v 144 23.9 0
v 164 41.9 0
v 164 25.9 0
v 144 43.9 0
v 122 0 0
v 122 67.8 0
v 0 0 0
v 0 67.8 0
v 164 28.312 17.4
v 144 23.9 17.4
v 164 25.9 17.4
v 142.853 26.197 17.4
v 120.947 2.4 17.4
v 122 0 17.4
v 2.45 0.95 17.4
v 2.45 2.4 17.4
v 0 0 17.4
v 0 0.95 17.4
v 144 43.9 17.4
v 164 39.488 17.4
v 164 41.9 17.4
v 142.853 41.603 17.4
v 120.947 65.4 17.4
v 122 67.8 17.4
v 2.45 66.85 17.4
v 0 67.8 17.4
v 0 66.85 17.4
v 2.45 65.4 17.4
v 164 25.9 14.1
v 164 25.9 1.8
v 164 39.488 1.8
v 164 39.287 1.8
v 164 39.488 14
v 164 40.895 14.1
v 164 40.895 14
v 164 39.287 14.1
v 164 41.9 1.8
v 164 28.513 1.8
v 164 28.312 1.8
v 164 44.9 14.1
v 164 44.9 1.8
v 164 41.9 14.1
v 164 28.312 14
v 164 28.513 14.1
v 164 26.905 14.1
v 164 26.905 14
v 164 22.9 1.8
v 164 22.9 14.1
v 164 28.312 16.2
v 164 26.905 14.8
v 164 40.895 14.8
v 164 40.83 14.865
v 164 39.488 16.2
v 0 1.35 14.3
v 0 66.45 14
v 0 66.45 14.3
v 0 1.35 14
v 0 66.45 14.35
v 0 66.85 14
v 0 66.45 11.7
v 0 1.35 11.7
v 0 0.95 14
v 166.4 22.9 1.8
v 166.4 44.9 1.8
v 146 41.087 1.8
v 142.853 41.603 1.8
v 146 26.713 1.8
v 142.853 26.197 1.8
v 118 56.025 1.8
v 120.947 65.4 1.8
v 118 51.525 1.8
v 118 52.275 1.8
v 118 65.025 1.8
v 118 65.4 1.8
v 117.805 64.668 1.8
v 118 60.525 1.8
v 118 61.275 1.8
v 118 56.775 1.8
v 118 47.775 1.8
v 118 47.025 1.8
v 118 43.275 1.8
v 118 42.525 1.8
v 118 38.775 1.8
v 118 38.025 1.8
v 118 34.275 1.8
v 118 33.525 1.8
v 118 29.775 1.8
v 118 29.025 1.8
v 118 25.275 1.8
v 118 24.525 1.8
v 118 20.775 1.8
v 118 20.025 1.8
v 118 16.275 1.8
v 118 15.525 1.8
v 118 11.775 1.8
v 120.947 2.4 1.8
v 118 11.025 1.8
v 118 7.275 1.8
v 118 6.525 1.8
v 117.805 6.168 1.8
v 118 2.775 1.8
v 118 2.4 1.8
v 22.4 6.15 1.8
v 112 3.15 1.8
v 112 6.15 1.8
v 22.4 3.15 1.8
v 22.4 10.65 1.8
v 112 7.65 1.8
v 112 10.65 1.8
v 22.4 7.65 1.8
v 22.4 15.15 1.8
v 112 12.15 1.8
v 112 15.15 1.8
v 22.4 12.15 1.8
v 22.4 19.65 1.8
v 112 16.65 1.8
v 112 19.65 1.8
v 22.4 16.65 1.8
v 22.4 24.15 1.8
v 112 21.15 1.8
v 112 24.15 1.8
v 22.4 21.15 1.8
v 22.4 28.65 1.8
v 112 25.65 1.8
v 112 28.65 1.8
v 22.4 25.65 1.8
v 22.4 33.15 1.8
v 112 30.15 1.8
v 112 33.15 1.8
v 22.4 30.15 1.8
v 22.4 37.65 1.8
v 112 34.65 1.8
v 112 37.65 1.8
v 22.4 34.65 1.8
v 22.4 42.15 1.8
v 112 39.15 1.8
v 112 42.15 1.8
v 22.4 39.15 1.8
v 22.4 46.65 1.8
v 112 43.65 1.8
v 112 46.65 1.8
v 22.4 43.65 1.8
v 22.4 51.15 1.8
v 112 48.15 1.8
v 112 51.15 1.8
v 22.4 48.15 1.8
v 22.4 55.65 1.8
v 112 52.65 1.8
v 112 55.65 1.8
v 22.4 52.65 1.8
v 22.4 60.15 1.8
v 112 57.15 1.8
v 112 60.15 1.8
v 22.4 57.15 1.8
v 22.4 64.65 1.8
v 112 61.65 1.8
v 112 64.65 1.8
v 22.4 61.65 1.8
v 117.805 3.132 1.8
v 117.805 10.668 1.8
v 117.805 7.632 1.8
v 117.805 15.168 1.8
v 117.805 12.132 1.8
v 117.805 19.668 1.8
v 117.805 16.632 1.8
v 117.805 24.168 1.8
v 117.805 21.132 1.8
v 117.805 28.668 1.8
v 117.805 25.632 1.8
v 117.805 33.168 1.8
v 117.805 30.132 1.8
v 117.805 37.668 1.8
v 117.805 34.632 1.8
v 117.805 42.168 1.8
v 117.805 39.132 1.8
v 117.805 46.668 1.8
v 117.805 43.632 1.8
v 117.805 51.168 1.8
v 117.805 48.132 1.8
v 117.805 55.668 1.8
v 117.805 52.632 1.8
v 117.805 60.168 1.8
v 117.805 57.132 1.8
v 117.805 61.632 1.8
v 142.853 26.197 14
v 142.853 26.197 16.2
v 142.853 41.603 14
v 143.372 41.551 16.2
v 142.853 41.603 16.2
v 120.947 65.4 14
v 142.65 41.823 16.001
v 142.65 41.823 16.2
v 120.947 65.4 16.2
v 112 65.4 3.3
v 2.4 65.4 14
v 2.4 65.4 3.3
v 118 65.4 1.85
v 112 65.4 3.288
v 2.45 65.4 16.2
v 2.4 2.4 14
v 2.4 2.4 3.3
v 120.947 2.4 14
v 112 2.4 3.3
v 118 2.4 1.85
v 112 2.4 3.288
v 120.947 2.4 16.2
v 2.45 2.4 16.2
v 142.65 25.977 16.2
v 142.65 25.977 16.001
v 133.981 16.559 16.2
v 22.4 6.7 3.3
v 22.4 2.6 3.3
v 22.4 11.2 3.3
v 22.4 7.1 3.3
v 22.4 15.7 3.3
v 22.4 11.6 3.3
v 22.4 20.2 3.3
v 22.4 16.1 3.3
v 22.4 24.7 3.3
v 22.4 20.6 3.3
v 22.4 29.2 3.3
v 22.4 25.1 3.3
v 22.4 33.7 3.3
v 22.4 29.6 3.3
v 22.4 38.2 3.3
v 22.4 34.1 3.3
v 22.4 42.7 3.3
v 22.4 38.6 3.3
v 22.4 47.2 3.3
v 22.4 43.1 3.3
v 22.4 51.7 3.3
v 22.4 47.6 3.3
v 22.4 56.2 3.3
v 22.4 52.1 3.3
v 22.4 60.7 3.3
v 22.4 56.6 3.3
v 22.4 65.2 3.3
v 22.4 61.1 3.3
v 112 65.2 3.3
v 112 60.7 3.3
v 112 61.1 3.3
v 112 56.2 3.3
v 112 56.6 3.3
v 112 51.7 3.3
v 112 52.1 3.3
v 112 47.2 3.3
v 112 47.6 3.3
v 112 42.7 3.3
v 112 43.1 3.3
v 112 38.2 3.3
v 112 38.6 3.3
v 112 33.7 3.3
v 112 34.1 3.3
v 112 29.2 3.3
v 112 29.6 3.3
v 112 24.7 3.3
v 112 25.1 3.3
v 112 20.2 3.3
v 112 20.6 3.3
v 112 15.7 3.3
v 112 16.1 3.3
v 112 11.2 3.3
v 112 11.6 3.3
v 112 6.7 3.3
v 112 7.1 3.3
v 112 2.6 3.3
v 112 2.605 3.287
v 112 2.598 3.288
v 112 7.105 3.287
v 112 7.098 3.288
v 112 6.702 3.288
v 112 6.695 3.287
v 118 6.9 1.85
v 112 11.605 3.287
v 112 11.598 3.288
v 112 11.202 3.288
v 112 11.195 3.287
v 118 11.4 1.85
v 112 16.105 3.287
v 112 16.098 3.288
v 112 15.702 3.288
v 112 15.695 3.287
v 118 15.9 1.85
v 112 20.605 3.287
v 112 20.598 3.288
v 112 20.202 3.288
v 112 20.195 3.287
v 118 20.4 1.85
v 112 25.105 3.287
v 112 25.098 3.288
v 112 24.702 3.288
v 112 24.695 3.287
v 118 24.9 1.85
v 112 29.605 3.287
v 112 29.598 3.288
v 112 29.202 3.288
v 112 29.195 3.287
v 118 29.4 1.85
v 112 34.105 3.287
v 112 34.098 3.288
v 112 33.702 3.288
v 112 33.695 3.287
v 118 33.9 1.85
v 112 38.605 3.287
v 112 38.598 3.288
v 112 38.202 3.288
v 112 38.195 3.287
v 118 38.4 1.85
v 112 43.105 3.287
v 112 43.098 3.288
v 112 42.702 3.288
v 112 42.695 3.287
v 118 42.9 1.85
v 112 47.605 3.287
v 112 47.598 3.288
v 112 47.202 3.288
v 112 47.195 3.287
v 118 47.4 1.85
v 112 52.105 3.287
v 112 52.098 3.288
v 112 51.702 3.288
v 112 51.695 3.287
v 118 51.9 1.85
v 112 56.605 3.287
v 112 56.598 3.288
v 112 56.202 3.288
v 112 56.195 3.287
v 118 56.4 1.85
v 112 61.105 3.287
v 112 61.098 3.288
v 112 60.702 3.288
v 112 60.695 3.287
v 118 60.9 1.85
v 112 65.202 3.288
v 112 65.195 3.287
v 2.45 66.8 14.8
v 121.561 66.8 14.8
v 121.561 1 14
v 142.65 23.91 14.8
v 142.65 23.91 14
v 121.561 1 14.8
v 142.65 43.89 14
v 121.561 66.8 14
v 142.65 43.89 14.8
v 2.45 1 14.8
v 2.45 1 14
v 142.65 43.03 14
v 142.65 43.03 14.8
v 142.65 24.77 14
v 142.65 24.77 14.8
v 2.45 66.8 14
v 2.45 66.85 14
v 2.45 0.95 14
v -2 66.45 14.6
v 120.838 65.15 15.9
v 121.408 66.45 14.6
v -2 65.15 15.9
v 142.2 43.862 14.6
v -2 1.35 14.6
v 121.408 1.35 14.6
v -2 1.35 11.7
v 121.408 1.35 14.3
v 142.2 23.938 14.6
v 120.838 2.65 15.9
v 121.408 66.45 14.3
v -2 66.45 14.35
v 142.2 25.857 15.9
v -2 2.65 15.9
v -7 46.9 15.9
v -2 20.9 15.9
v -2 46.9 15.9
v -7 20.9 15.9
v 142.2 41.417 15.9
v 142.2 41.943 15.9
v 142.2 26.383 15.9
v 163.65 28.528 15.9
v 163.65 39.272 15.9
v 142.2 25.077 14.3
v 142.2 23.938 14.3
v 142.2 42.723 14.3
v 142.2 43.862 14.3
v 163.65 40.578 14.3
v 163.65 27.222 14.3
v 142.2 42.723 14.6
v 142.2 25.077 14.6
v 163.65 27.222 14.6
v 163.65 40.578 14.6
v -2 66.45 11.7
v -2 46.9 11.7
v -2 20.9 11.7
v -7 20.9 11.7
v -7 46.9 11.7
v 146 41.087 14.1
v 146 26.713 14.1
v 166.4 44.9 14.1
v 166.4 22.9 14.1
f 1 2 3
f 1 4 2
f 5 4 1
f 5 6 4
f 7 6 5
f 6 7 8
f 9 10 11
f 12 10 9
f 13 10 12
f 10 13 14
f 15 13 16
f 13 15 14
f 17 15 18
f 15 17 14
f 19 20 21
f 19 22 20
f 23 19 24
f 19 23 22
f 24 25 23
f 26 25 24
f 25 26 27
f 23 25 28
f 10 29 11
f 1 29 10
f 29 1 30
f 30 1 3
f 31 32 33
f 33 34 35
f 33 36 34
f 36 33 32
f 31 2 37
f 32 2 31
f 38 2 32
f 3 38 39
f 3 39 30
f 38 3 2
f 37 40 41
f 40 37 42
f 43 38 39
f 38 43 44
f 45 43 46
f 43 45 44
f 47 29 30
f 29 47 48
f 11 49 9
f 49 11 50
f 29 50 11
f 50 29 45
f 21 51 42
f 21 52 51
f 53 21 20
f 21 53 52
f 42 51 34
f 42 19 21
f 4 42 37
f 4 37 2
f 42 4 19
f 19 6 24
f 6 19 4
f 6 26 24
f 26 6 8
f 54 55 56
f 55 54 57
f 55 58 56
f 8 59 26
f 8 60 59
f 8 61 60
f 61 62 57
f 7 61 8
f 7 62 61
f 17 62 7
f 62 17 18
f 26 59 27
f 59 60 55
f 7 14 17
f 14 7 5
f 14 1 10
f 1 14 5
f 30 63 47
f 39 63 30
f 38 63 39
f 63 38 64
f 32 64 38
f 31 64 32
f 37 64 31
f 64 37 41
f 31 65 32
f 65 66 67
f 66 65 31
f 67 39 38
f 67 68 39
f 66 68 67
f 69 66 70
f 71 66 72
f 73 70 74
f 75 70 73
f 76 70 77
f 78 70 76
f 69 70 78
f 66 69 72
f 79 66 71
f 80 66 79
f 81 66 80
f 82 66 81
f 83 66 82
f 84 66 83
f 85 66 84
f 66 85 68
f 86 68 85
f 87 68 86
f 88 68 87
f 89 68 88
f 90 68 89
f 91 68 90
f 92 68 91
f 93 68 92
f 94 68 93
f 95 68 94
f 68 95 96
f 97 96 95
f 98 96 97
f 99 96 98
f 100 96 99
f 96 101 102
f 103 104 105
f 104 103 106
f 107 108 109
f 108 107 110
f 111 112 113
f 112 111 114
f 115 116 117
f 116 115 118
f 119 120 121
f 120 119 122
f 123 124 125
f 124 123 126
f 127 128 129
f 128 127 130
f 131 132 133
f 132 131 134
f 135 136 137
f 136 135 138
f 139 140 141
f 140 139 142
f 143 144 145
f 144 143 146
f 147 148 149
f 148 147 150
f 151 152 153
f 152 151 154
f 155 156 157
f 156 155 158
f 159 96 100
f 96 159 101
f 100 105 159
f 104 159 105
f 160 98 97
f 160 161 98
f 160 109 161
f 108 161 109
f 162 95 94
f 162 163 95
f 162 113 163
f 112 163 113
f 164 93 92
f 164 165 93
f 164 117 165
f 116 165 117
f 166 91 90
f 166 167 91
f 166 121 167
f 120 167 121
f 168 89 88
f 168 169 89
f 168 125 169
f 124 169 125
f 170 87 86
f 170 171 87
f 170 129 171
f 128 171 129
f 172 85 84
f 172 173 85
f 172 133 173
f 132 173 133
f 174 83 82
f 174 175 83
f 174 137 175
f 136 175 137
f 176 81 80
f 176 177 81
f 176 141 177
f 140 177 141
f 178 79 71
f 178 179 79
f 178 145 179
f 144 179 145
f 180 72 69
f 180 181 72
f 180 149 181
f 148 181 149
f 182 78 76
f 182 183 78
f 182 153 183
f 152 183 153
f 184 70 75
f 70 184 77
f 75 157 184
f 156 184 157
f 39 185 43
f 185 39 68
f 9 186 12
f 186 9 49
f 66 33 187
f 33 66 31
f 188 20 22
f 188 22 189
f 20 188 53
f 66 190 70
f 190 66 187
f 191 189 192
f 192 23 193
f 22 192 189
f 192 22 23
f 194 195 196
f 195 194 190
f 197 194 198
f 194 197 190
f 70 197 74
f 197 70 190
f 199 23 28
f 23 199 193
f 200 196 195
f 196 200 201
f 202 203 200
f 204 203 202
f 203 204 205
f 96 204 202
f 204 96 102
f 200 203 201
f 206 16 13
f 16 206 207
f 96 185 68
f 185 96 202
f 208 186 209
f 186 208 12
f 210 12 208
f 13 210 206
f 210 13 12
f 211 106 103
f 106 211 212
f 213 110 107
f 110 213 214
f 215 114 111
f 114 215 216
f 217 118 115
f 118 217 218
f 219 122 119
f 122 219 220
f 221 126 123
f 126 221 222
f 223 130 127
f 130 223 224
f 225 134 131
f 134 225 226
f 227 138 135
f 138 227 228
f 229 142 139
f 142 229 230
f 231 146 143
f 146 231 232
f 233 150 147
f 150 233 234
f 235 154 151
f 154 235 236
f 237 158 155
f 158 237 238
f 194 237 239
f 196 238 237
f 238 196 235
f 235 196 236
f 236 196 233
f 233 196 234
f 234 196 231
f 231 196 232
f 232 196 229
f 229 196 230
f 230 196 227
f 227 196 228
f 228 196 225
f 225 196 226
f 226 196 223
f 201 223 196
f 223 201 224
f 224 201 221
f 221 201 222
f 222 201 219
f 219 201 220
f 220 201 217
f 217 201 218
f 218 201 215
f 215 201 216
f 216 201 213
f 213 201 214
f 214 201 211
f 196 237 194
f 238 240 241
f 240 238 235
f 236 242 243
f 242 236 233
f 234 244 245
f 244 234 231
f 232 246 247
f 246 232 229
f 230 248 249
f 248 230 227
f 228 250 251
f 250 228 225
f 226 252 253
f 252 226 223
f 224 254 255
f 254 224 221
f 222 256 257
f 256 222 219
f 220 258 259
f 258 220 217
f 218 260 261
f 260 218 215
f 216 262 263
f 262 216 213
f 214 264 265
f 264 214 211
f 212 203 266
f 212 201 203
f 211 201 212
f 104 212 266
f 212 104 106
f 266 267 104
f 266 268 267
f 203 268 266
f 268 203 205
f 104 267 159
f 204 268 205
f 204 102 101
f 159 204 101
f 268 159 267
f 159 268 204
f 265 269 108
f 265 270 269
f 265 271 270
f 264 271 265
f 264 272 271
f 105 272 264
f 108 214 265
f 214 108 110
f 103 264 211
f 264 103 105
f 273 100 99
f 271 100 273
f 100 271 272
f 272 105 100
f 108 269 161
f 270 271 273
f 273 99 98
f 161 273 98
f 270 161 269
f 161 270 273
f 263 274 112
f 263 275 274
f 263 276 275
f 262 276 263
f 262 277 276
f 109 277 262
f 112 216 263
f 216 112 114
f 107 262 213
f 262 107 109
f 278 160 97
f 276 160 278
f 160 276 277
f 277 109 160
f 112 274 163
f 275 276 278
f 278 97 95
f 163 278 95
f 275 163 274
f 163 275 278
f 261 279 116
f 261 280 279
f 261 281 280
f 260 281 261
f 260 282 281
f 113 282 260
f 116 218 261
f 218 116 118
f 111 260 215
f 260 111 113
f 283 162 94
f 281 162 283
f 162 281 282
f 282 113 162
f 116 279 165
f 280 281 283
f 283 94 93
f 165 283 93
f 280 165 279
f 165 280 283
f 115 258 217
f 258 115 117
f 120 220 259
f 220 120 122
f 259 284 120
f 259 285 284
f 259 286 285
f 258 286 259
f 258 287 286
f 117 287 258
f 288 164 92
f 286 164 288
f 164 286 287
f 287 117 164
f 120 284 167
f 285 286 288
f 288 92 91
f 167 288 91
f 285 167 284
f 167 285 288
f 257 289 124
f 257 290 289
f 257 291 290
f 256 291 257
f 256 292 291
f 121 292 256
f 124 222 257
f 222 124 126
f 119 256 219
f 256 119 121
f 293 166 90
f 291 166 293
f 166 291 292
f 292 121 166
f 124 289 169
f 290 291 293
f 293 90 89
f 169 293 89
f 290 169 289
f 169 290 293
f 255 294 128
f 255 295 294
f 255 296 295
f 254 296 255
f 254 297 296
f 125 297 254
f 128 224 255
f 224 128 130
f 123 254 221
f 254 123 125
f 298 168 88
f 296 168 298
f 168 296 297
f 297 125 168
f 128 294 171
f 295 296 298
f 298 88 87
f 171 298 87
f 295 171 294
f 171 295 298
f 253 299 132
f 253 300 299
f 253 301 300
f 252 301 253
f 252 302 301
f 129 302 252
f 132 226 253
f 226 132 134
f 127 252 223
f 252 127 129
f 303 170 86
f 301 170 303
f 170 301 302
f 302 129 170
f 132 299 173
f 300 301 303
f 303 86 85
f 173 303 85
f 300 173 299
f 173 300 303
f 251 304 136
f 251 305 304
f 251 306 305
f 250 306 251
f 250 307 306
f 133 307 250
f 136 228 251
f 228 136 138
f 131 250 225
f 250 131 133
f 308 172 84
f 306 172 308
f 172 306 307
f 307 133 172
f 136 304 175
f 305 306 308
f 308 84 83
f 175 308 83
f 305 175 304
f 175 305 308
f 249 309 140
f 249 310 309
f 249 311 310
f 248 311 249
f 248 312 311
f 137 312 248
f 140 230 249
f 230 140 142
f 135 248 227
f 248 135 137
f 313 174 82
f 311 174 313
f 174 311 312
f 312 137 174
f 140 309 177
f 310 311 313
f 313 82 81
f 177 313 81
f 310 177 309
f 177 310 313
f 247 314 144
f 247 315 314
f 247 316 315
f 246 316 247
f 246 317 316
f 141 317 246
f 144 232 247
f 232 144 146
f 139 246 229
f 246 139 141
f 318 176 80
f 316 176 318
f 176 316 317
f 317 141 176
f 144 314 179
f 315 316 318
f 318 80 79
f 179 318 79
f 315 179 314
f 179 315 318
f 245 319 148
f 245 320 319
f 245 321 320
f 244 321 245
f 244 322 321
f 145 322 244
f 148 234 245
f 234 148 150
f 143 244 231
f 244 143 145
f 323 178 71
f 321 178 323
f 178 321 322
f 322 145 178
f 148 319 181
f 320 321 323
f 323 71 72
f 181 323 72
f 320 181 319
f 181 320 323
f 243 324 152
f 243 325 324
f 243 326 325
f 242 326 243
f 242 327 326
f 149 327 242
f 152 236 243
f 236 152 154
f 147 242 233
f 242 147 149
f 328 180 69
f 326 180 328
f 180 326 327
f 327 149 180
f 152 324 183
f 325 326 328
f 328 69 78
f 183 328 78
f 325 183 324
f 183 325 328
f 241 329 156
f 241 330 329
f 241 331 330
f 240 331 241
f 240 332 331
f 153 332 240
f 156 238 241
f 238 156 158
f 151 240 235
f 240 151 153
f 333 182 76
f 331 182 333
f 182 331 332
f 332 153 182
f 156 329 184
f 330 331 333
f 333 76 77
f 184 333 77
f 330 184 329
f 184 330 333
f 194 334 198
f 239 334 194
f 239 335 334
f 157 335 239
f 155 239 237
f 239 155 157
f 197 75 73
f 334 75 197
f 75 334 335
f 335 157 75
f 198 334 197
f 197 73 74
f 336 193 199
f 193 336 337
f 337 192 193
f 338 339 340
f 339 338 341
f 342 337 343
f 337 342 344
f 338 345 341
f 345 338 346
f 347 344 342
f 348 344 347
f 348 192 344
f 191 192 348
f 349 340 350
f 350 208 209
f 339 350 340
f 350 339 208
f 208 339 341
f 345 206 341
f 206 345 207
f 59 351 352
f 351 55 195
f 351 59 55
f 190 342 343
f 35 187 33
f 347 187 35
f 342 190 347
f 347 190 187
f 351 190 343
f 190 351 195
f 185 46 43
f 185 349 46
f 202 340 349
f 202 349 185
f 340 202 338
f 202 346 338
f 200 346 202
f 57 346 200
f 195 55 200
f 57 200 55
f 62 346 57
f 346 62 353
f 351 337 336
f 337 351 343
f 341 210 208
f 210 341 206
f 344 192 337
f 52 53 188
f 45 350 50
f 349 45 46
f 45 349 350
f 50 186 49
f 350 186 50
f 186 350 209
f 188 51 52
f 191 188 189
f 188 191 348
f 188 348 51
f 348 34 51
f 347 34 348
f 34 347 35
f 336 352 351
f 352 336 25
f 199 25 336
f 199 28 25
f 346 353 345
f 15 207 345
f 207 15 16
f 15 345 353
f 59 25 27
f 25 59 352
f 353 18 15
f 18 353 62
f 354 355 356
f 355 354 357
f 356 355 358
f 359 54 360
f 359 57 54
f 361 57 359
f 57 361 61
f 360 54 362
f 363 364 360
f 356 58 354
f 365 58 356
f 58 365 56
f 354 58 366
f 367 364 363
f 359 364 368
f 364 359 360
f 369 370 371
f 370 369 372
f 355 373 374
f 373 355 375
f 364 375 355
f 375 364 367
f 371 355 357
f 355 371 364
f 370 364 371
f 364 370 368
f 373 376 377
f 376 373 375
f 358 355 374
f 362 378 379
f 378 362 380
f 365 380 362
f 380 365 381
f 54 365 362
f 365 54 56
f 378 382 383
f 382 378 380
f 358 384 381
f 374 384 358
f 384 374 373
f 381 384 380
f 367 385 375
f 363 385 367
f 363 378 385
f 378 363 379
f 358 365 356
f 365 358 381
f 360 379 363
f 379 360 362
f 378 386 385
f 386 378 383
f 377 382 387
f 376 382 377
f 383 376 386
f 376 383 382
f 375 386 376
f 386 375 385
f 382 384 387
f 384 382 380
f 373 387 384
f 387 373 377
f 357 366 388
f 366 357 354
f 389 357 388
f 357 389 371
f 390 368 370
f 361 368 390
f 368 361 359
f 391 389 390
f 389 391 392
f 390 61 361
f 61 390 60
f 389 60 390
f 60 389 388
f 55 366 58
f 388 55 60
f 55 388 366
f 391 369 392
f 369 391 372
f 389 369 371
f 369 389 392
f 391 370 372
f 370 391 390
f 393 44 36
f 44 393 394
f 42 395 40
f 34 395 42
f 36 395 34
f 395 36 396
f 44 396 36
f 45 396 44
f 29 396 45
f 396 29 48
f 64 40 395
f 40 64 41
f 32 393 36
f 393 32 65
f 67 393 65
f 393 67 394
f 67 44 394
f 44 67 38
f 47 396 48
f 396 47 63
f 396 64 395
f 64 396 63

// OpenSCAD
// Generated CAD, millimeters. Edit build_tray.py dimensions and rebuild for parameter changes.
// F6 render; choose part below. Export tray/lid/plug in their print orientations.
part = "assembly"; // "tray", "lid", "plug", "assembly", "exploded"
module tray(){difference(){difference(){difference(){union(){union(){union(){union(){union(){union(){union(){union(){union(){union(){union(){union(){union(){union(){union(){union(){difference(){translate([0,0,0])linear_extrude(height=17.4)polygon(points=[[144.0,23.899999998509884],[164.0,25.899999998509884],[164.0,41.899999998509884],[144.0,43.899999998509884],[122.0,67.79999999701977],[0.0,67.79999999701977],[0.0,0.0],[122.0,0.0]],paths=[[0,1,2,3,4,5,6,7]]);translate([0,0,1.8])linear_extrude(height=16.599999999999998)polygon(points=[[142.852615326643,26.1972316801548],[154.7516910508275,27.38713925331831],[165.0,28.411970146000385],[165.0,39.38802985101938],[144.0,41.4880298525095],[144.0,41.48802984505892],[142.852615326643,41.60276831686497],[120.94721379131079,65.39999999850988],[2.399999998509884,65.39999999850988],[2.399999998509884,2.399999998509884],[120.94721379131079,2.399999998509884]],paths=[[0,1,2,3,4,5,6,7,8,9,10]]);}translate([2.35,2.35,1.75])cube([20.049999999999997,63.09999999999999,1.5499999999999998]);}intersection(){union(){polyhedron(points=[[22.350000381469727,1.649999976158142,1.75],[22.350000381469727,1.649999976158142,1.7999999523162842],[22.350000381469727,2.200000047683716,3.299999952316284],[22.350000381469727,3.1500000953674316,1.75],[22.350000381469727,3.1500000953674316,1.7999999523162842],[22.350000381469727,2.5999999046325684,3.299999952316284],[112.0,1.649999976158142,1.75],[112.0,1.649999976158142,1.7999999523162842],[112.0,2.200000047683716,3.299999952316284],[112.0,3.1500000953674316,1.75],[112.0,3.1500000953674316,1.7999999523162842],[112.0,2.5999999046325684,3.299999952316284]],faces=[[1,0,2],[1,6,0],[3,0,6],[2,0,5],[8,1,2],[3,5,0],[4,5,3],[4,3,10],[4,10,5],[11,2,5],[6,1,7],[8,7,1],[7,11,6],[8,2,11],[8,11,7],[9,3,6],[9,10,3],[9,6,10],[11,10,6],[11,5,10]],convexity=10);polyhedron(points=[[111.94999694824219,1.649999976158142,1.75],[111.94999694824219,1.649999976158142,1.7999999523162842],[111.94999694824219,2.200000047683716,3.299999952316284],[111.94999694824219,3.1500000953674316,1.75],[111.94999694824219,3.1500000953674316,1.7999999523162842],[111.94999694824219,2.5999999046325684,3.299999952316284],[118.0,1.649999976158142,1.75],[118.0,2.4000000953674316,1.850000023841858],[118.0,3.1500000953674316,1.75]],faces=[[1,0,2],[1,6,0],[1,2,6],[3,0,6],[2,0,5],[3,5,0],[4,5,3],[4,3,8],[4,8,5],[7,2,5],[7,6,2],[8,3,6],[7,5,8],[7,8,6]],convexity=10);}translate([0,0,0])linear_extrude(height=17.4)polygon(points=[[144.0,23.899999998509884],[164.0,25.899999998509884],[164.0,41.899999998509884],[144.0,43.899999998509884],[122.0,67.79999999701977],[0.0,67.79999999701977],[0.0,0.0],[122.0,0.0]],paths=[[0,1,2,3,4,5,6,7]]);}}intersection(){union(){polyhedron(points=[[22.350000381469727,6.150000095367432,1.75],[22.350000381469727,6.150000095367432,1.7999999523162842],[22.350000381469727,6.699999809265137,3.299999952316284],[22.350000381469727,7.650000095367432,1.75],[22.350000381469727,7.650000095367432,1.7999999523162842],[22.350000381469727,7.099999904632568,3.299999952316284],[112.0,6.150000095367432,1.75],[112.0,6.150000095367432,1.7999999523162842],[112.0,6.699999809265137,3.299999952316284],[112.0,7.650000095367432,1.75],[112.0,7.650000095367432,1.7999999523162842],[112.0,7.099999904632568,3.299999952316284]],faces=[[1,0,2],[1,6,0],[7,1,2],[3,0,6],[2,0,5],[3,5,0],[4,5,3],[4,3,10],[4,10,5],[11,2,5],[6,1,7],[7,11,6],[8,7,2],[8,2,11],[8,11,7],[9,3,6],[9,10,3],[9,6,10],[11,10,6],[11,5,10]],convexity=10);polyhedron(points=[[111.94999694824219,6.150000095367432,1.75],[111.94999694824219,6.150000095367432,1.7999999523162842],[111.94999694824219,6.699999809265137,3.299999952316284],[111.94999694824219,7.650000095367432,1.75],[111.94999694824219,7.650000095367432,1.7999999523162842],[111.94999694824219,7.099999904632568,3.299999952316284],[118.0,6.150000095367432,1.75],[118.0,6.900000095367432,1.850000023841858],[118.0,7.650000095367432,1.75]],faces=[[1,0,2],[1,6,0],[1,2,6],[3,0,6],[2,0,5],[3,5,0],[4,5,3],[4,3,8],[4,8,5],[7,2,5],[7,6,2],[8,3,6],[7,5,8],[7,8,6]],convexity=10);}translate([0,0,0])linear_extrude(height=17.4)polygon(points=[[144.0,23.899999998509884],[164.0,25.899999998509884],[164.0,41.899999998509884],[144.0,43.899999998509884],[122.0,67.79999999701977],[0.0,67.79999999701977],[0.0,0.0],[122.0,0.0]],paths=[[0,1,2,3,4,5,6,7]]);}}intersection(){union(){polyhedron(points=[[22.350000381469727,10.649999618530273,1.75],[22.350000381469727,10.649999618530273,1.7999999523162842],[22.350000381469727,11.199999809265137,3.299999952316284],[22.350000381469727,12.149999618530273,1.75],[22.350000381469727,12.149999618530273,1.7999999523162842],[22.350000381469727,11.600000381469727,3.299999952316284],[112.0,10.649999618530273,1.75],[112.0,10.649999618530273,1.7999999523162842],[112.0,11.199999809265137,3.299999952316284],[112.0,12.149999618530273,1.75],[112.0,12.149999618530273,1.7999999523162842],[112.0,11.600000381469727,3.299999952316284]],faces=[[1,0,2],[1,6,0],[7,1,2],[3,0,6],[2,0,5],[3,5,0],[4,5,3],[4,3,10],[4,10,5],[11,2,5],[6,1,7],[7,11,6],[8,7,2],[8,2,11],[8,11,7],[9,3,6],[9,10,3],[9,6,10],[11,10,6],[11,5,10]],convexity=10);polyhedron(points=[[111.94999694824219,10.649999618530273,1.75],[111.94999694824219,10.649999618530273,1.7999999523162842],[111.94999694824219,11.199999809265137,3.299999952316284],[111.94999694824219,12.149999618530273,1.75],[111.94999694824219,12.149999618530273,1.7999999523162842],[111.94999694824219,11.600000381469727,3.299999952316284],[118.0,10.649999618530273,1.75],[118.0,11.399999618530273,1.850000023841858],[118.0,12.149999618530273,1.75]],faces=[[1,0,2],[1,6,0],[1,2,6],[3,0,6],[2,0,5],[3,5,0],[4,5,3],[4,3,8],[4,8,5],[7,2,5],[7,6,2],[8,3,6],[8,7,5],[7,8,6]],convexity=10);}translate([0,0,0])linear_extrude(height=17.4)polygon(points=[[144.0,23.899999998509884],[164.0,25.899999998509884],[164.0,41.899999998509884],[144.0,43.899999998509884],[122.0,67.79999999701977],[0.0,67.79999999701977],[0.0,0.0],[122.0,0.0]],paths=[[0,1,2,3,4,5,6,7]]);}}intersection(){union(){polyhedron(points=[[22.350000381469727,15.149999618530273,1.75],[22.350000381469727,15.149999618530273,1.7999999523162842],[22.350000381469727,15.699999809265137,3.299999952316284],[22.350000381469727,16.649999618530273,1.75],[22.350000381469727,16.649999618530273,1.7999999523162842],[22.350000381469727,16.100000381469727,3.299999952316284],[112.0,15.149999618530273,1.75],[112.0,15.149999618530273,1.7999999523162842],[112.0,15.699999809265137,3.299999952316284],[112.0,16.649999618530273,1.75],[112.0,16.649999618530273,1.7999999523162842],[112.0,16.100000381469727,3.299999952316284]],faces=[[1,0,2],[1,6,0],[7,1,2],[3,0,6],[2,0,5],[3,5,0],[4,5,3],[4,3,10],[4,10,5],[11,2,5],[6,1,7],[7,11,6],[8,7,2],[8,2,11],[8,11,7],[9,3,6],[9,10,3],[9,6,10],[11,10,6],[11,5,10]],convexity=10);polyhedron(points=[[111.94999694824219,15.149999618530273,1.75],[111.94999694824219,15.149999618530273,1.7999999523162842],[111.94999694824219,15.699999809265137,3.299999952316284],[111.94999694824219,16.649999618530273,1.75],[111.94999694824219,16.649999618530273,1.7999999523162842],[111.94999694824219,16.100000381469727,3.299999952316284],[118.0,15.149999618530273,1.75],[118.0,15.899999618530273,1.850000023841858],[118.0,16.649999618530273,1.75]],faces=[[1,0,2],[1,6,0],[1,2,6],[3,0,6],[2,0,5],[3,5,0],[4,5,3],[4,3,8],[4,8,5],[7,2,5],[7,6,2],[7,8,6],[8,3,6],[7,5,8]],convexity=10);}translate([0,0,0])linear_extrude(height=17.4)polygon(points=[[144.0,23.899999998509884],[164.0,25.899999998509884],[164.0,41.899999998509884],[144.0,43.899999998509884],[122.0,67.79999999701977],[0.0,67.79999999701977],[0.0,0.0],[122.0,0.0]],paths=[[0,1,2,3,4,5,6,7]]);}}intersection(){union(){polyhedron(points=[[22.350000381469727,19.649999618530273,1.75],[22.350000381469727,19.649999618530273,1.7999999523162842],[22.350000381469727,20.200000762939453,3.299999952316284],[22.350000381469727,21.149999618530273,1.75],[22.350000381469727,21.149999618530273,1.7999999523162842],[22.350000381469727,20.600000381469727,3.299999952316284],[112.0,19.649999618530273,1.75],[112.0,19.649999618530273,1.7999999523162842],[112.0,20.200000762939453,3.299999952316284],[112.0,21.149999618530273,1.75],[112.0,21.149999618530273,1.7999999523162842],[112.0,20.600000381469727,3.299999952316284]],faces=[[1,0,2],[1,6,0],[3,0,6],[2,0,5],[8,1,2],[3,5,0],[4,5,3],[4,3,10],[2,5,11],[4,11,5],[6,1,7],[8,7,1],[7,11,6],[8,2,11],[8,11,7],[9,3,6],[9,10,3],[11,4,10],[9,6,10],[11,10,6]],convexity=10);polyhedron(points=[[111.94999694824219,19.649999618530273,1.75],[111.94999694824219,19.649999618530273,1.7999999523162842],[111.94999694824219,20.200000762939453,3.299999952316284],[111.94999694824219,21.149999618530273,1.75],[111.94999694824219,21.149999618530273,1.7999999523162842],[111.94999694824219,20.600000381469727,3.299999952316284],[118.0,19.649999618530273,1.75],[118.0,20.399999618530273,1.850000023841858],[118.0,21.149999618530273,1.75]],faces=[[1,0,2],[1,6,0],[1,2,6],[3,0,6],[2,0,5],[3,5,0],[4,5,3],[4,3,8],[4,8,5],[7,2,5],[7,6,2],[8,3,6],[8,7,5],[7,8,6]],convexity=10);}translate([0,0,0])linear_extrude(height=17.4)polygon(points=[[144.0,23.899999998509884],[164.0,25.899999998509884],[164.0,41.899999998509884],[144.0,43.899999998509884],[122.0,67.79999999701977],[0.0,67.79999999701977],[0.0,0.0],[122.0,0.0]],paths=[[0,1,2,3,4,5,6,7]]);}}intersection(){union(){polyhedron(points=[[22.350000381469727,24.149999618530273,1.75],[22.350000381469727,24.149999618530273,1.7999999523162842],[22.350000381469727,24.700000762939453,3.299999952316284],[22.350000381469727,25.649999618530273,1.75],[22.350000381469727,25.649999618530273,1.7999999523162842],[22.350000381469727,25.100000381469727,3.299999952316284],[112.0,24.149999618530273,1.75],[112.0,24.149999618530273,1.7999999523162842],[112.0,24.700000762939453,3.299999952316284],[112.0,25.649999618530273,1.75],[112.0,25.649999618530273,1.7999999523162842],[112.0,25.100000381469727,3.299999952316284]],faces=[[1,0,2],[1,6,0],[7,1,2],[3,0,6],[2,0,5],[3,5,0],[4,5,3],[4,3,10],[4,10,5],[11,2,5],[6,1,7],[7,11,6],[8,7,2],[8,2,11],[8,11,7],[9,3,6],[9,10,3],[9,6,10],[11,10,6],[11,5,10]],convexity=10);polyhedron(points=[[111.94999694824219,24.149999618530273,1.75],[111.94999694824219,24.149999618530273,1.7999999523162842],[111.94999694824219,24.700000762939453,3.299999952316284],[111.94999694824219,25.649999618530273,1.75],[111.94999694824219,25.649999618530273,1.7999999523162842],[111.94999694824219,25.100000381469727,3.299999952316284],[118.0,24.149999618530273,1.75],[118.0,24.899999618530273,1.850000023841858],[118.0,25.649999618530273,1.75]],faces=[[1,0,2],[1,6,0],[1,2,6],[3,0,6],[2,0,5],[7,2,5],[3,5,0],[4,5,3],[4,3,8],[4,8,5],[7,6,2],[7,8,6],[8,3,6],[8,7,5]],convexity=10);}translate([0,0,0])linear_extrude(height=17.4)polygon(points=[[144.0,23.899999998509884],[164.0,25.899999998509884],[164.0,41.899999998509884],[144.0,43.899999998509884],[122.0,67.79999999701977],[0.0,67.79999999701977],[0.0,0.0],[122.0,0.0]],paths=[[0,1,2,3,4,5,6,7]]);}}intersection(){union(){polyhedron(points=[[22.350000381469727,28.649999618530273,1.75],[22.350000381469727,28.649999618530273,1.7999999523162842],[22.350000381469727,29.200000762939453,3.299999952316284],[22.350000381469727,30.149999618530273,1.75],[22.350000381469727,30.149999618530273,1.7999999523162842],[22.350000381469727,29.600000381469727,3.299999952316284],[112.0,28.649999618530273,1.75],[112.0,28.649999618530273,1.7999999523162842],[112.0,29.200000762939453,3.299999952316284],[112.0,30.149999618530273,1.75],[112.0,30.149999618530273,1.7999999523162842],[112.0,29.600000381469727,3.299999952316284]],faces=[[1,0,2],[1,6,0],[7,1,2],[3,0,6],[2,0,5],[3,5,0],[4,5,3],[4,3,10],[4,10,5],[11,2,5],[6,1,7],[7,11,6],[8,7,2],[8,2,11],[8,11,7],[9,3,6],[9,10,3],[9,6,10],[11,10,6],[11,5,10]],convexity=10);polyhedron(points=[[111.94999694824219,28.649999618530273,1.75],[111.94999694824219,28.649999618530273,1.7999999523162842],[111.94999694824219,29.200000762939453,3.299999952316284],[111.94999694824219,30.149999618530273,1.75],[111.94999694824219,30.149999618530273,1.7999999523162842],[111.94999694824219,29.600000381469727,3.299999952316284],[118.0,28.649999618530273,1.75],[118.0,29.399999618530273,1.850000023841858],[118.0,30.149999618530273,1.75]],faces=[[1,0,2],[1,6,0],[1,2,6],[3,0,6],[2,0,5],[7,2,5],[3,5,0],[4,5,3],[4,3,8],[4,8,5],[7,6,2],[7,8,6],[8,3,6],[8,7,5]],convexity=10);}translate([0,0,0])linear_extrude(height=17.4)polygon(points=[[144.0,23.899999998509884],[164.0,25.899999998509884],[164.0,41.899999998509884],[144.0,43.899999998509884],[122.0,67.79999999701977],[0.0,67.79999999701977],[0.0,0.0],[122.0,0.0]],paths=[[0,1,2,3,4,5,6,7]]);}}intersection(){union(){polyhedron(points=[[22.350000381469727,33.150001525878906,1.75],[22.350000381469727,33.150001525878906,1.7999999523162842],[22.350000381469727,33.70000076293945,3.299999952316284],[22.350000381469727,34.650001525878906,1.75],[22.350000381469727,34.650001525878906,1.7999999523162842],[22.350000381469727,34.099998474121094,3.299999952316284],[112.0,33.150001525878906,1.75],[112.0,33.150001525878906,1.7999999523162842],[112.0,33.70000076293945,3.299999952316284],[112.0,34.650001525878906,1.75],[112.0,34.650001525878906,1.7999999523162842],[112.0,34.099998474121094,3.299999952316284]],faces=[[1,0,2],[1,6,0],[7,1,2],[3,0,6],[2,0,5],[3,5,0],[4,5,3],[4,3,10],[4,10,5],[11,2,5],[6,1,7],[7,11,6],[8,7,2],[8,2,11],[8,11,7],[9,3,6],[9,10,3],[9,6,10],[11,10,6],[11,5,10]],convexity=10);polyhedron(points=[[111.94999694824219,33.150001525878906,1.75],[111.94999694824219,33.150001525878906,1.7999999523162842],[111.94999694824219,33.70000076293945,3.299999952316284],[111.94999694824219,34.650001525878906,1.75],[111.94999694824219,34.650001525878906,1.7999999523162842],[111.94999694824219,34.099998474121094,3.299999952316284],[118.0,33.150001525878906,1.75],[118.0,33.900001525878906,1.850000023841858],[118.0,34.650001525878906,1.75]],faces=[[1,0,2],[1,6,0],[1,2,6],[3,0,6],[2,0,5],[3,5,0],[4,5,3],[4,3,8],[4,8,5],[7,2,5],[7,6,2],[8,3,6],[8,7,5],[7,8,6]],convexity=10);}translate([0,0,0])linear_extrude(height=17.4)polygon(points=[[144.0,23.899999998509884],[164.0,25.899999998509884],[164.0,41.899999998509884],[144.0,43.899999998509884],[122.0,67.79999999701977],[0.0,67.79999999701977],[0.0,0.0],[122.0,0.0]],paths=[[0,1,2,3,4,5,6,7]]);}}intersection(){union(){polyhedron(points=[[22.350000381469727,37.650001525878906,1.75],[22.350000381469727,37.650001525878906,1.7999999523162842],[22.350000381469727,38.20000076293945,3.299999952316284],[22.350000381469727,39.150001525878906,1.75],[22.350000381469727,39.150001525878906,1.7999999523162842],[22.350000381469727,38.599998474121094,3.299999952316284],[112.0,37.650001525878906,1.75],[112.0,37.650001525878906,1.7999999523162842],[112.0,38.20000076293945,3.299999952316284],[112.0,39.150001525878906,1.75],[112.0,39.150001525878906,1.7999999523162842],[112.0,38.599998474121094,3.299999952316284]],faces=[[1,0,2],[1,6,0],[7,1,2],[3,0,6],[2,0,5],[3,5,0],[4,5,3],[4,3,10],[4,10,5],[11,2,5],[6,1,7],[7,11,6],[8,7,2],[8,2,11],[8,11,7],[9,3,6],[9,10,3],[9,6,10],[11,10,6],[11,5,10]],convexity=10);polyhedron(points=[[111.94999694824219,37.650001525878906,1.75],[111.94999694824219,37.650001525878906,1.7999999523162842],[111.94999694824219,38.20000076293945,3.299999952316284],[111.94999694824219,39.150001525878906,1.75],[111.94999694824219,39.150001525878906,1.7999999523162842],[111.94999694824219,38.599998474121094,3.299999952316284],[118.0,37.650001525878906,1.75],[118.0,38.400001525878906,1.850000023841858],[118.0,39.150001525878906,1.75]],faces=[[1,0,2],[1,6,0],[1,2,6],[3,0,6],[2,0,5],[3,5,0],[4,5,3],[4,3,8],[4,8,5],[7,2,5],[7,6,2],[8,3,6],[8,7,5],[7,8,6]],convexity=10);}translate([0,0,0])linear_extrude(height=17.4)polygon(points=[[144.0,23.899999998509884],[164.0,25.899999998509884],[164.0,41.899999998509884],[144.0,43.899999998509884],[122.0,67.79999999701977],[0.0,67.79999999701977],[0.0,0.0],[122.0,0.0]],paths=[[0,1,2,3,4,5,6,7]]);}}intersection(){union(){polyhedron(points=[[22.350000381469727,42.150001525878906,1.75],[22.350000381469727,42.150001525878906,1.7999999523162842],[22.350000381469727,42.70000076293945,3.299999952316284],[22.350000381469727,43.650001525878906,1.75],[22.350000381469727,43.650001525878906,1.7999999523162842],[22.350000381469727,43.099998474121094,3.299999952316284],[112.0,42.150001525878906,1.75],[112.0,42.150001525878906,1.7999999523162842],[112.0,42.70000076293945,3.299999952316284],[112.0,43.650001525878906,1.75],[112.0,43.650001525878906,1.7999999523162842],[112.0,43.099998474121094,3.299999952316284]],faces=[[1,0,2],[1,6,0],[7,1,2],[3,0,6],[2,0,5],[3,5,0],[4,5,3],[4,3,10],[4,10,5],[11,2,5],[6,1,7],[7,11,6],[8,7,2],[8,2,11],[8,11,7],[9,3,6],[9,10,3],[9,6,10],[11,10,6],[11,5,10]],convexity=10);polyhedron(points=[[111.94999694824219,42.150001525878906,1.75],[111.94999694824219,42.150001525878906,1.7999999523162842],[111.94999694824219,42.70000076293945,3.299999952316284],[111.94999694824219,43.650001525878906,1.75],[111.94999694824219,43.650001525878906,1.7999999523162842],[111.94999694824219,43.099998474121094,3.299999952316284],[118.0,42.150001525878906,1.75],[118.0,42.900001525878906,1.850000023841858],[118.0,43.650001525878906,1.75]],faces=[[1,0,2],[1,6,0],[1,2,6],[3,0,6],[2,0,5],[3,5,0],[4,5,3],[4,3,8],[4,8,5],[7,2,5],[7,6,2],[8,3,6],[8,7,5],[7,8,6]],convexity=10);}translate([0,0,0])linear_extrude(height=17.4)polygon(points=[[144.0,23.899999998509884],[164.0,25.899999998509884],[164.0,41.899999998509884],[144.0,43.899999998509884],[122.0,67.79999999701977],[0.0,67.79999999701977],[0.0,0.0],[122.0,0.0]],paths=[[0,1,2,3,4,5,6,7]]);}}intersection(){union(){polyhedron(points=[[22.350000381469727,46.650001525878906,1.75],[22.350000381469727,46.650001525878906,1.7999999523162842],[22.350000381469727,47.20000076293945,3.299999952316284],[22.350000381469727,48.150001525878906,1.75],[22.350000381469727,48.150001525878906,1.7999999523162842],[22.350000381469727,47.599998474121094,3.299999952316284],[112.0,46.650001525878906,1.75],[112.0,46.650001525878906,1.7999999523162842],[112.0,47.20000076293945,3.299999952316284],[112.0,48.150001525878906,1.75],[112.0,48.150001525878906,1.7999999523162842],[112.0,47.599998474121094,3.299999952316284]],faces=[[1,0,2],[1,6,0],[7,1,2],[3,0,6],[2,0,5],[3,5,0],[4,5,3],[4,3,10],[4,10,5],[11,2,5],[6,1,7],[7,11,6],[8,7,2],[8,2,11],[8,11,7],[9,3,6],[9,10,3],[9,6,10],[11,10,6],[11,5,10]],convexity=10);polyhedron(points=[[111.94999694824219,46.650001525878906,1.75],[111.94999694824219,46.650001525878906,1.7999999523162842],[111.94999694824219,47.20000076293945,3.299999952316284],[111.94999694824219,48.150001525878906,1.75],[111.94999694824219,48.150001525878906,1.7999999523162842],[111.94999694824219,47.599998474121094,3.299999952316284],[118.0,46.650001525878906,1.75],[118.0,47.400001525878906,1.850000023841858],[118.0,48.150001525878906,1.75]],faces=[[1,0,2],[1,6,0],[1,2,6],[3,0,6],[2,0,5],[3,5,0],[4,5,3],[4,3,8],[4,8,5],[7,2,5],[7,6,2],[8,3,6],[8,7,5],[7,8,6]],convexity=10);}translate([0,0,0])linear_extrude(height=17.4)polygon(points=[[144.0,23.899999998509884],[164.0,25.899999998509884],[164.0,41.899999998509884],[144.0,43.899999998509884],[122.0,67.79999999701977],[0.0,67.79999999701977],[0.0,0.0],[122.0,0.0]],paths=[[0,1,2,3,4,5,6,7]]);}}intersection(){union(){polyhedron(points=[[22.350000381469727,51.150001525878906,1.75],[22.350000381469727,51.150001525878906,1.7999999523162842],[22.350000381469727,51.70000076293945,3.299999952316284],[22.350000381469727,52.650001525878906,1.75],[22.350000381469727,52.650001525878906,1.7999999523162842],[22.350000381469727,52.099998474121094,3.299999952316284],[112.0,51.150001525878906,1.75],[112.0,51.150001525878906,1.7999999523162842],[112.0,51.70000076293945,3.299999952316284],[112.0,52.650001525878906,1.75],[112.0,52.650001525878906,1.7999999523162842],[112.0,52.099998474121094,3.299999952316284]],faces=[[1,0,2],[1,6,0],[7,1,2],[3,0,6],[2,0,5],[3,5,0],[4,5,3],[4,3,10],[4,10,5],[11,2,5],[6,1,7],[7,11,6],[8,7,2],[8,2,11],[8,11,7],[9,3,6],[9,10,3],[9,6,10],[11,10,6],[11,5,10]],convexity=10);polyhedron(points=[[111.94999694824219,51.150001525878906,1.75],[111.94999694824219,51.150001525878906,1.7999999523162842],[111.94999694824219,51.70000076293945,3.299999952316284],[111.94999694824219,52.650001525878906,1.75],[111.94999694824219,52.650001525878906,1.7999999523162842],[111.94999694824219,52.099998474121094,3.299999952316284],[118.0,51.150001525878906,1.75],[118.0,51.900001525878906,1.850000023841858],[118.0,52.650001525878906,1.75]],faces=[[1,0,2],[1,6,0],[1,2,6],[3,0,6],[2,0,5],[3,5,0],[4,5,3],[4,3,8],[4,8,5],[7,2,5],[7,6,2],[8,3,6],[8,7,5],[7,8,6]],convexity=10);}translate([0,0,0])linear_extrude(height=17.4)polygon(points=[[144.0,23.899999998509884],[164.0,25.899999998509884],[164.0,41.899999998509884],[144.0,43.899999998509884],[122.0,67.79999999701977],[0.0,67.79999999701977],[0.0,0.0],[122.0,0.0]],paths=[[0,1,2,3,4,5,6,7]]);}}intersection(){union(){polyhedron(points=[[22.350000381469727,55.650001525878906,1.75],[22.350000381469727,55.650001525878906,1.7999999523162842],[22.350000381469727,56.20000076293945,3.299999952316284],[22.350000381469727,57.150001525878906,1.75],[22.350000381469727,57.150001525878906,1.7999999523162842],[22.350000381469727,56.599998474121094,3.299999952316284],[112.0,55.650001525878906,1.75],[112.0,55.650001525878906,1.7999999523162842],[112.0,56.20000076293945,3.299999952316284],[112.0,57.150001525878906,1.75],[112.0,57.150001525878906,1.7999999523162842],[112.0,56.599998474121094,3.299999952316284]],faces=[[1,0,2],[1,6,0],[7,1,2],[3,0,6],[2,0,5],[3,5,0],[4,5,3],[4,3,10],[4,10,5],[11,2,5],[6,1,7],[7,11,6],[8,7,2],[8,2,11],[8,11,7],[9,3,6],[9,10,3],[9,6,10],[11,10,6],[11,5,10]],convexity=10);polyhedron(points=[[111.94999694824219,55.650001525878906,1.75],[111.94999694824219,55.650001525878906,1.7999999523162842],[111.94999694824219,56.20000076293945,3.299999952316284],[111.94999694824219,57.150001525878906,1.75],[111.94999694824219,57.150001525878906,1.7999999523162842],[111.94999694824219,56.599998474121094,3.299999952316284],[118.0,55.650001525878906,1.75],[118.0,56.400001525878906,1.850000023841858],[118.0,57.150001525878906,1.75]],faces=[[1,0,2],[1,6,0],[1,2,6],[3,0,6],[2,0,5],[3,5,0],[4,5,3],[4,3,8],[4,8,5],[7,2,5],[7,6,2],[8,3,6],[8,7,5],[7,8,6]],convexity=10);}translate([0,0,0])linear_extrude(height=17.4)polygon(points=[[144.0,23.899999998509884],[164.0,25.899999998509884],[164.0,41.899999998509884],[144.0,43.899999998509884],[122.0,67.79999999701977],[0.0,67.79999999701977],[0.0,0.0],[122.0,0.0]],paths=[[0,1,2,3,4,5,6,7]]);}}intersection(){union(){polyhedron(points=[[22.350000381469727,60.150001525878906,1.75],[22.350000381469727,60.150001525878906,1.7999999523162842],[22.350000381469727,60.70000076293945,3.299999952316284],[22.350000381469727,61.650001525878906,1.75],[22.350000381469727,61.650001525878906,1.7999999523162842],[22.350000381469727,61.099998474121094,3.299999952316284],[112.0,60.150001525878906,1.75],[112.0,60.150001525878906,1.7999999523162842],[112.0,60.70000076293945,3.299999952316284],[112.0,61.650001525878906,1.75],[112.0,61.650001525878906,1.7999999523162842],[112.0,61.099998474121094,3.299999952316284]],faces=[[1,0,2],[1,6,0],[7,1,2],[3,0,6],[2,0,5],[3,5,0],[4,5,3],[4,3,10],[4,10,5],[11,2,5],[6,1,7],[7,11,6],[8,7,2],[8,2,11],[8,11,7],[9,3,6],[9,10,3],[9,6,10],[11,10,6],[11,5,10]],convexity=10);polyhedron(points=[[111.94999694824219,60.150001525878906,1.75],[111.94999694824219,60.150001525878906,1.7999999523162842],[111.94999694824219,60.70000076293945,3.299999952316284],[111.94999694824219,61.650001525878906,1.75],[111.94999694824219,61.650001525878906,1.7999999523162842],[111.94999694824219,61.099998474121094,3.299999952316284],[118.0,60.150001525878906,1.75],[118.0,60.900001525878906,1.850000023841858],[118.0,61.650001525878906,1.75]],faces=[[1,0,2],[1,6,0],[1,2,6],[3,0,6],[2,0,5],[3,5,0],[4,5,3],[4,3,8],[4,8,5],[7,2,5],[7,6,2],[8,3,6],[8,7,5],[7,8,6]],convexity=10);}translate([0,0,0])linear_extrude(height=17.4)polygon(points=[[144.0,23.899999998509884],[164.0,25.899999998509884],[164.0,41.899999998509884],[144.0,43.899999998509884],[122.0,67.79999999701977],[0.0,67.79999999701977],[0.0,0.0],[122.0,0.0]],paths=[[0,1,2,3,4,5,6,7]]);}}intersection(){union(){polyhedron(points=[[22.350000381469727,64.6500015258789,1.75],[22.350000381469727,64.6500015258789,1.7999999523162842],[22.350000381469727,65.19999694824219,3.299999952316284],[22.350000381469727,66.1500015258789,1.75],[22.350000381469727,66.1500015258789,1.7999999523162842],[22.350000381469727,65.5999984741211,3.299999952316284],[112.0,64.6500015258789,1.75],[112.0,64.6500015258789,1.7999999523162842],[112.0,65.19999694824219,3.299999952316284],[112.0,66.1500015258789,1.75],[112.0,66.1500015258789,1.7999999523162842],[112.0,65.5999984741211,3.299999952316284]],faces=[[1,0,2],[1,6,0],[7,1,2],[3,0,6],[2,0,5],[3,5,0],[4,5,3],[4,3,10],[4,10,5],[11,2,5],[6,1,7],[7,11,6],[8,7,2],[8,2,11],[8,11,7],[9,3,6],[9,10,3],[9,6,10],[11,10,6],[11,5,10]],convexity=10);polyhedron(points=[[111.94999694824219,64.6500015258789,1.75],[111.94999694824219,64.6500015258789,1.7999999523162842],[111.94999694824219,65.19999694824219,3.299999952316284],[111.94999694824219,66.1500015258789,1.75],[111.94999694824219,66.1500015258789,1.7999999523162842],[111.94999694824219,65.5999984741211,3.299999952316284],[118.0,64.6500015258789,1.75],[118.0,65.4000015258789,1.850000023841858],[118.0,66.1500015258789,1.75]],faces=[[1,0,2],[1,6,0],[1,2,6],[3,0,6],[2,0,5],[3,5,0],[4,5,3],[4,3,8],[4,8,5],[7,2,5],[7,6,2],[8,3,6],[8,7,5],[7,8,6]],convexity=10);}translate([0,0,0])linear_extrude(height=17.4)polygon(points=[[144.0,23.899999998509884],[164.0,25.899999998509884],[164.0,41.899999998509884],[144.0,43.899999998509884],[122.0,67.79999999701977],[0.0,67.79999999701977],[0.0,0.0],[122.0,0.0]],paths=[[0,1,2,3,4,5,6,7]]);}}polyhedron(points=[[1.0,1.0,14.0],[1.0,1.0,14.800000190734863],[2.4000000953674316,2.4000000953674316,16.200000762939453],[1.0,66.80000305175781,14.0],[1.0,66.80000305175781,14.800000190734863],[2.4000000953674316,65.4000015258789,16.200000762939453],[121.56134033203125,1.0,14.0],[121.56134033203125,1.0,14.800000190734863],[142.64999389648438,23.909954071044922,14.0],[142.64999389648438,23.909954071044922,14.800000190734863],[120.94721221923828,2.4000000953674316,16.200000762939453],[142.64999389648438,25.97711753845215,16.200000762939453],[142.64999389648438,43.890045166015625,14.0],[142.64999389648438,43.890045166015625,14.800000190734863],[121.56134033203125,66.80000305175781,14.0],[121.56134033203125,66.80000305175781,14.800000190734863],[142.64999389648438,41.82288360595703,16.200000762939453],[120.94721221923828,65.4000015258789,16.200000762939453]],faces=[[0,3,1],[7,0,1],[0,8,3],[2,1,5],[2,10,1],[2,5,10],[4,1,3],[4,3,14],[4,5,1],[17,5,4],[6,0,7],[6,8,0],[6,7,8],[9,8,7],[9,11,8],[11,13,8],[1,10,7],[9,7,10],[9,10,11],[17,11,10],[14,3,8],[15,4,14],[12,8,13],[12,14,8],[12,13,14],[15,14,13],[10,5,17],[15,17,4],[16,13,11],[16,11,17],[15,13,17],[16,17,13]],convexity=10);}polyhedron(points=[[142.60000610351562,24.76498794555664,14.0],[142.60000610351562,24.76498794555664,14.800000190734863],[142.60000610351562,26.222219467163086,16.25],[142.60000610351562,43.035011291503906,14.0],[142.60000610351562,43.035011291503906,14.800000190734863],[142.60000610351562,41.577781677246094,16.25],[165.0,27.004987716674805,14.0],[165.0,27.004987716674805,14.800000190734863],[165.0,28.46221923828125,16.25],[165.0,40.795013427734375,14.0],[165.0,40.795013427734375,14.800000190734863],[165.0,39.3377799987793,16.25]],faces=[[0,3,1],[0,1,6],[0,6,3],[2,1,5],[2,8,1],[2,5,8],[5,1,3],[4,5,3],[4,3,9],[11,5,4],[7,6,1],[7,8,6],[7,1,8],[8,11,6],[9,3,6],[10,4,9],[9,6,11],[10,9,11],[8,5,11],[10,11,4]],convexity=10);}translate([-1,0.95,14.0])cube([3.4499999999999997,65.89999999999999,4.399999999999999]);}}
module lid_assembly(){union(){union(){union(){union(){polyhedron(points=[[1.350000023841858,1.350000023841858,14.300000190734863],[1.350000023841858,1.350000023841858,14.600000381469727],[2.6500000953674316,2.6500000953674316,15.899999618530273],[1.350000023841858,66.44999694824219,14.300000190734863],[1.350000023841858,66.44999694824219,14.600000381469727],[2.6500000953674316,65.1500015258789,15.899999618530273],[121.40780639648438,1.350000023841858,14.300000190734863],[121.40780639648438,1.350000023841858,14.600000381469727],[142.1999969482422,23.937881469726562,14.300000190734863],[142.1999969482422,23.937881469726562,14.600000381469727],[120.8375473022461,2.6500000953674316,15.899999618530273],[142.1999969482422,25.857391357421875,15.899999618530273],[142.1999969482422,43.862117767333984,14.300000190734863],[142.1999969482422,43.862117767333984,14.600000381469727],[121.40780639648438,66.44999694824219,14.300000190734863],[121.40780639648438,66.44999694824219,14.600000381469727],[142.1999969482422,41.94260787963867,15.899999618530273],[120.8375473022461,65.1500015258789,15.899999618530273]],faces=[[0,3,1],[7,0,1],[0,8,3],[2,1,5],[2,10,1],[2,5,10],[4,1,3],[4,5,1],[4,3,14],[17,5,4],[6,0,7],[6,8,0],[1,10,7],[6,7,8],[9,8,7],[9,7,10],[9,11,8],[11,13,8],[9,10,11],[17,11,10],[14,3,8],[15,4,14],[15,17,4],[12,8,13],[12,14,8],[12,13,14],[15,14,13],[15,13,17],[10,5,17],[16,13,11],[16,11,17],[16,17,13]],convexity=10);polyhedron(points=[[142.14999389648438,25.071733474731445,14.300000190734863],[142.14999389648438,25.071733474731445,14.600000381469727],[142.14999389648438,26.378217697143555,15.899999618530273],[142.14999389648438,42.728267669677734,14.300000190734863],[142.14999389648438,42.728267669677734,14.600000381469727],[142.14999389648438,41.421783447265625,15.899999618530273],[163.64999389648438,27.22173309326172,14.300000190734863],[163.64999389648438,27.22173309326172,14.600000381469727],[163.64999389648438,28.528217315673828,15.899999618530273],[163.64999389648438,40.57826614379883,14.300000190734863],[163.64999389648438,40.57826614379883,14.600000381469727],[163.64999389648438,39.27178192138672,15.899999618530273]],faces=[[0,3,1],[0,1,6],[2,7,1],[0,6,3],[2,1,5],[2,5,8],[5,1,3],[4,5,3],[4,3,9],[11,5,4],[7,6,1],[7,8,6],[7,2,8],[8,11,6],[9,3,6],[10,4,9],[10,11,4],[9,6,11],[10,9,11],[8,5,11]],convexity=10);}polyhedron(points=[[-2.0,1.350000023841858,14.300000190734863],[-2.0,1.350000023841858,14.600000381469727],[-2.0,2.6500000953674316,15.899999618530273],[-2.0,66.44999694824219,14.300000190734863],[-2.0,66.44999694824219,14.600000381469727],[-2.0,65.1500015258789,15.899999618530273],[4.0,1.350000023841858,14.300000190734863],[4.0,1.350000023841858,14.600000381469727],[4.0,2.6500000953674316,15.899999618530273],[4.0,66.44999694824219,14.300000190734863],[4.0,66.44999694824219,14.600000381469727],[4.0,65.1500015258789,15.899999618530273]],faces=[[1,0,2],[1,6,0],[5,2,0],[1,2,8],[2,5,8],[3,5,0],[5,3,4],[3,0,9],[4,3,9],[4,11,5],[7,6,1],[7,1,8],[6,9,0],[7,8,6],[6,8,9],[10,4,9],[10,11,4],[10,9,11],[11,8,5],[11,9,8]],convexity=10);}translate([-2,1.35,11.7])cube([2.0,65.10000000000001,2.650000000000002]);}translate([-7,20.9,11.7])cube([6.0,26.0,4.200000000000001]);}}
module plug_assembly(){translate([0,0,1.8])linear_extrude(height=12.3)polygon(points=[[166.39999999850988,44.899999998509884],[164.0,44.899999998509884],[164.0,39.28703233599663],[146.0,41.087032340466976],[146.0,26.712967664003372],[164.0,28.51296766102314],[164.0,22.899999998509884],[166.39999999850988,22.899999998509884]],paths=[[0,1,2,3,4,5,6,7]]);}
module lid(){translate([7.0,66.44999694824219,15.899999618530273]){rotate([180,0,0]){union(){union(){union(){union(){polyhedron(points=[[1.350000023841858,1.350000023841858,14.300000190734863],[1.350000023841858,1.350000023841858,14.600000381469727],[2.6500000953674316,2.6500000953674316,15.899999618530273],[1.350000023841858,66.44999694824219,14.300000190734863],[1.350000023841858,66.44999694824219,14.600000381469727],[2.6500000953674316,65.1500015258789,15.899999618530273],[121.40780639648438,1.350000023841858,14.300000190734863],[121.40780639648438,1.350000023841858,14.600000381469727],[142.1999969482422,23.937881469726562,14.300000190734863],[142.1999969482422,23.937881469726562,14.600000381469727],[120.8375473022461,2.6500000953674316,15.899999618530273],[142.1999969482422,25.857391357421875,15.899999618530273],[142.1999969482422,43.862117767333984,14.300000190734863],[142.1999969482422,43.862117767333984,14.600000381469727],[121.40780639648438,66.44999694824219,14.300000190734863],[121.40780639648438,66.44999694824219,14.600000381469727],[142.1999969482422,41.94260787963867,15.899999618530273],[120.8375473022461,65.1500015258789,15.899999618530273]],faces=[[0,3,1],[7,0,1],[0,8,3],[2,1,5],[2,10,1],[2,5,10],[4,1,3],[4,5,1],[4,3,14],[17,5,4],[6,0,7],[6,8,0],[1,10,7],[6,7,8],[9,8,7],[9,7,10],[9,11,8],[11,13,8],[9,10,11],[17,11,10],[14,3,8],[15,4,14],[15,17,4],[12,8,13],[12,14,8],[12,13,14],[15,14,13],[15,13,17],[10,5,17],[16,13,11],[16,11,17],[16,17,13]],convexity=10);polyhedron(points=[[142.14999389648438,25.071733474731445,14.300000190734863],[142.14999389648438,25.071733474731445,14.600000381469727],[142.14999389648438,26.378217697143555,15.899999618530273],[142.14999389648438,42.728267669677734,14.300000190734863],[142.14999389648438,42.728267669677734,14.600000381469727],[142.14999389648438,41.421783447265625,15.899999618530273],[163.64999389648438,27.22173309326172,14.300000190734863],[163.64999389648438,27.22173309326172,14.600000381469727],[163.64999389648438,28.528217315673828,15.899999618530273],[163.64999389648438,40.57826614379883,14.300000190734863],[163.64999389648438,40.57826614379883,14.600000381469727],[163.64999389648438,39.27178192138672,15.899999618530273]],faces=[[0,3,1],[0,1,6],[2,7,1],[0,6,3],[2,1,5],[2,5,8],[5,1,3],[4,5,3],[4,3,9],[11,5,4],[7,6,1],[7,8,6],[7,2,8],[8,11,6],[9,3,6],[10,4,9],[10,11,4],[9,6,11],[10,9,11],[8,5,11]],convexity=10);}polyhedron(points=[[-2.0,1.350000023841858,14.300000190734863],[-2.0,1.350000023841858,14.600000381469727],[-2.0,2.6500000953674316,15.899999618530273],[-2.0,66.44999694824219,14.300000190734863],[-2.0,66.44999694824219,14.600000381469727],[-2.0,65.1500015258789,15.899999618530273],[4.0,1.350000023841858,14.300000190734863],[4.0,1.350000023841858,14.600000381469727],[4.0,2.6500000953674316,15.899999618530273],[4.0,66.44999694824219,14.300000190734863],[4.0,66.44999694824219,14.600000381469727],[4.0,65.1500015258789,15.899999618530273]],faces=[[1,0,2],[1,6,0],[5,2,0],[1,2,8],[2,5,8],[3,5,0],[5,3,4],[3,0,9],[4,3,9],[4,11,5],[7,6,1],[7,1,8],[6,9,0],[7,8,6],[6,8,9],[10,4,9],[10,11,4],[10,9,11],[11,8,5],[11,9,8]],convexity=10);}translate([-2,1.35,11.7])cube([2.0,65.10000000000001,2.650000000000002]);}translate([-7,20.9,11.7])cube([6.0,26.0,4.200000000000001]);}}}}
module plug(){translate([-146.0,-22.899999618530273,-1.7999999523162842]){translate([0,0,1.8])linear_extrude(height=12.3)polygon(points=[[166.39999999850988,44.899999998509884],[164.0,44.899999998509884],[164.0,39.28703233599663],[146.0,41.087032340466976],[146.0,26.712967664003372],[164.0,28.51296766102314],[164.0,22.899999998509884],[166.39999999850988,22.899999998509884]],paths=[[0,1,2,3,4,5,6,7]]);}}
if(part=="tray")tray(); else if(part=="lid")lid(); else if(part=="plug")plug();
else if(part=="assembly"){color("LightSeaGreen")tray(); color("LightGray")lid_assembly(); color("Orange")plug_assembly();}
else if(part=="exploded"){color("LightSeaGreen")tray(); color("LightGray")translate([-16,0,30])lid_assembly(); color("Orange")translate([0,0,23])plug_assembly();}
